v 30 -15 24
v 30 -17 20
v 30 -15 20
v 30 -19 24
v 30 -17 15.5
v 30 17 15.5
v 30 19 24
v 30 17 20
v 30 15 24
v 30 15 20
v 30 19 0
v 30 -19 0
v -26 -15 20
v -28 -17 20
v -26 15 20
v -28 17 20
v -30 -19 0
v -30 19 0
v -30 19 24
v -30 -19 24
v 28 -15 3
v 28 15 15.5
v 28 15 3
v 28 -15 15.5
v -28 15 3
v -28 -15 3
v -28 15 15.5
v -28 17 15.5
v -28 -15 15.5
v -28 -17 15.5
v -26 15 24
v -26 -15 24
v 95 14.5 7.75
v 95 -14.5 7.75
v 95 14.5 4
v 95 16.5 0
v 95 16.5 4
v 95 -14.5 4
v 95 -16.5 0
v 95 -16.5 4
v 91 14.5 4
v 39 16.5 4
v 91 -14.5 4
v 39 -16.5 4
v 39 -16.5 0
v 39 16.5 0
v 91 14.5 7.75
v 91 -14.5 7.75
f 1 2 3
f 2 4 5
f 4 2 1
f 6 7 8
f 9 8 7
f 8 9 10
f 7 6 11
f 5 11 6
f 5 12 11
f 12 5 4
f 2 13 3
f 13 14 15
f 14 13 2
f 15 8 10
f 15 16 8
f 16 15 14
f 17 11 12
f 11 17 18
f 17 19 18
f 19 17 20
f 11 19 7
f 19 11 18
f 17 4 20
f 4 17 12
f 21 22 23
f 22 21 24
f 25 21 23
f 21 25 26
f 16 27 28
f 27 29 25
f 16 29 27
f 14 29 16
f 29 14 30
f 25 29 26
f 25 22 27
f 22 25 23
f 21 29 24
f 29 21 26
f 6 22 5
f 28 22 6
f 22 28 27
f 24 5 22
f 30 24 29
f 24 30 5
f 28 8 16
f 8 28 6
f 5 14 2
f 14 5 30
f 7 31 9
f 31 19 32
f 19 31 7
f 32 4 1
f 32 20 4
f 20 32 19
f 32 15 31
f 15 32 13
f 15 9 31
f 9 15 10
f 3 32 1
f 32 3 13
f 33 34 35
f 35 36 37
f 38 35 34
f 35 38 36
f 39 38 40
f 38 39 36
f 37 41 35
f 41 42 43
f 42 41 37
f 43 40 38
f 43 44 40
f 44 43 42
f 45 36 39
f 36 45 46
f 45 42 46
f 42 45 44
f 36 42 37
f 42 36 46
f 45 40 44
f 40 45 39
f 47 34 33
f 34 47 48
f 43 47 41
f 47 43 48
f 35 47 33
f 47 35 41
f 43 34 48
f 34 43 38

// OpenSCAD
_x = 60;
_y = 38;
_z = 20;

// modules in library:
module slide_box(x, y, z)

{
    translate ([0,0,z/2])
union (){    
    difference(){
    cube ([x,y,z],true);
        translate ([0,0,3])
    cube ([x-4,y-8,z],true);
    translate ([2,0,z/2-2])
    cube ([x,y-4,5],true);
        }
        
translate ([0,0,z/2+2])        
difference(){
cube ([x,y,4],true);
    translate ([4,0,0])
    cube ([x,y-8,4],true);
}
}
///TOP
translate ([x+5,0,-z/2+4])
union(){
translate ([2,0,z/2-2])
cube ([x-4,y-5,4],true);
translate ([x/2-2,0,z/2])
cube ([4,y-9,7.5],true);
}
}
slide_box (x=_x, y=_y, z=_z);
